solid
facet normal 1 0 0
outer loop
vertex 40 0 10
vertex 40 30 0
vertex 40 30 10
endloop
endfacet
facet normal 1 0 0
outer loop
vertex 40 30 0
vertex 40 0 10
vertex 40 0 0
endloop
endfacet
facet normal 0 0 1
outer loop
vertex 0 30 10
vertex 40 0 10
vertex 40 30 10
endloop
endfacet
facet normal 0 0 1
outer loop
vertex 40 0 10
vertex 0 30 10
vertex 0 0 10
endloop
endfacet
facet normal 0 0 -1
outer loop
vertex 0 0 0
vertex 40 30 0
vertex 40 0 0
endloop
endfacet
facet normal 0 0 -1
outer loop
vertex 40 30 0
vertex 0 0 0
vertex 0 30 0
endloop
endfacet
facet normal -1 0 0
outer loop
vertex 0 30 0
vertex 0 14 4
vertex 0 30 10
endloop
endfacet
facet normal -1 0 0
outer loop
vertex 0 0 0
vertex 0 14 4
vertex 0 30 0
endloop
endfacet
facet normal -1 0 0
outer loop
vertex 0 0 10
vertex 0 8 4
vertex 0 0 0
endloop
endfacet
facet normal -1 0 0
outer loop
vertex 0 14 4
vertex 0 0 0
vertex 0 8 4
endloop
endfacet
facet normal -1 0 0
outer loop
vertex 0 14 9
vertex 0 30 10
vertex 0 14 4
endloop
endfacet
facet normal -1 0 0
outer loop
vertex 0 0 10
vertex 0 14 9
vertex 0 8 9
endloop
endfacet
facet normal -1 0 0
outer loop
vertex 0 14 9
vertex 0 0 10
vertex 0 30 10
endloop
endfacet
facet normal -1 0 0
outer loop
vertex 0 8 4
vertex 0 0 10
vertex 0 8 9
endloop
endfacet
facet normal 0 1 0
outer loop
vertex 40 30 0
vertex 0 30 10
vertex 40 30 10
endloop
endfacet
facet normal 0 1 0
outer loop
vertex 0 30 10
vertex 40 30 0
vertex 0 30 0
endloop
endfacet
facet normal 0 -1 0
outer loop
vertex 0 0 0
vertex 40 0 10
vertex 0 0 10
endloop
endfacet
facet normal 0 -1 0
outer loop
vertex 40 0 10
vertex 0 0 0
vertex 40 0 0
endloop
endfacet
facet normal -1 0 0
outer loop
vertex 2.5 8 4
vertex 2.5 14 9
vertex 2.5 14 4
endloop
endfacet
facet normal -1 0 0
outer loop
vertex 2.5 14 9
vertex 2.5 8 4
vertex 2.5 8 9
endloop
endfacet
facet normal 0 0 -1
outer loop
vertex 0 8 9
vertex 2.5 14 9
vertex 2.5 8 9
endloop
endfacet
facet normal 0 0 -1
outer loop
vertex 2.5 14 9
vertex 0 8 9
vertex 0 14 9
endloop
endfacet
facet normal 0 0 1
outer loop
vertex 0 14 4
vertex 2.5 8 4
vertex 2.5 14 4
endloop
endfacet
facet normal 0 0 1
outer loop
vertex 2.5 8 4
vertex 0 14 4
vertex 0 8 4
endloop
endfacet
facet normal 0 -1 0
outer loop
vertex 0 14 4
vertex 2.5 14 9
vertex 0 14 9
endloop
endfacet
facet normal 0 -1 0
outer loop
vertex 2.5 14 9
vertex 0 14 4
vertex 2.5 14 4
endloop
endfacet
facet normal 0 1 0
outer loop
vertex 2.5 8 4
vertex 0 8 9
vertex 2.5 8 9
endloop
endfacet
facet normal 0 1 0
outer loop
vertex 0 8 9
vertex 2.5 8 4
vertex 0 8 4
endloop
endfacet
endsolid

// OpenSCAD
// units=mm — generated by scad_emitter.py
// part=unnamed
$fn = 48;

difference() { cube([40, 30, 10]); translate([-0.5, 8, 4]) cube([3, 6, 5]); }
